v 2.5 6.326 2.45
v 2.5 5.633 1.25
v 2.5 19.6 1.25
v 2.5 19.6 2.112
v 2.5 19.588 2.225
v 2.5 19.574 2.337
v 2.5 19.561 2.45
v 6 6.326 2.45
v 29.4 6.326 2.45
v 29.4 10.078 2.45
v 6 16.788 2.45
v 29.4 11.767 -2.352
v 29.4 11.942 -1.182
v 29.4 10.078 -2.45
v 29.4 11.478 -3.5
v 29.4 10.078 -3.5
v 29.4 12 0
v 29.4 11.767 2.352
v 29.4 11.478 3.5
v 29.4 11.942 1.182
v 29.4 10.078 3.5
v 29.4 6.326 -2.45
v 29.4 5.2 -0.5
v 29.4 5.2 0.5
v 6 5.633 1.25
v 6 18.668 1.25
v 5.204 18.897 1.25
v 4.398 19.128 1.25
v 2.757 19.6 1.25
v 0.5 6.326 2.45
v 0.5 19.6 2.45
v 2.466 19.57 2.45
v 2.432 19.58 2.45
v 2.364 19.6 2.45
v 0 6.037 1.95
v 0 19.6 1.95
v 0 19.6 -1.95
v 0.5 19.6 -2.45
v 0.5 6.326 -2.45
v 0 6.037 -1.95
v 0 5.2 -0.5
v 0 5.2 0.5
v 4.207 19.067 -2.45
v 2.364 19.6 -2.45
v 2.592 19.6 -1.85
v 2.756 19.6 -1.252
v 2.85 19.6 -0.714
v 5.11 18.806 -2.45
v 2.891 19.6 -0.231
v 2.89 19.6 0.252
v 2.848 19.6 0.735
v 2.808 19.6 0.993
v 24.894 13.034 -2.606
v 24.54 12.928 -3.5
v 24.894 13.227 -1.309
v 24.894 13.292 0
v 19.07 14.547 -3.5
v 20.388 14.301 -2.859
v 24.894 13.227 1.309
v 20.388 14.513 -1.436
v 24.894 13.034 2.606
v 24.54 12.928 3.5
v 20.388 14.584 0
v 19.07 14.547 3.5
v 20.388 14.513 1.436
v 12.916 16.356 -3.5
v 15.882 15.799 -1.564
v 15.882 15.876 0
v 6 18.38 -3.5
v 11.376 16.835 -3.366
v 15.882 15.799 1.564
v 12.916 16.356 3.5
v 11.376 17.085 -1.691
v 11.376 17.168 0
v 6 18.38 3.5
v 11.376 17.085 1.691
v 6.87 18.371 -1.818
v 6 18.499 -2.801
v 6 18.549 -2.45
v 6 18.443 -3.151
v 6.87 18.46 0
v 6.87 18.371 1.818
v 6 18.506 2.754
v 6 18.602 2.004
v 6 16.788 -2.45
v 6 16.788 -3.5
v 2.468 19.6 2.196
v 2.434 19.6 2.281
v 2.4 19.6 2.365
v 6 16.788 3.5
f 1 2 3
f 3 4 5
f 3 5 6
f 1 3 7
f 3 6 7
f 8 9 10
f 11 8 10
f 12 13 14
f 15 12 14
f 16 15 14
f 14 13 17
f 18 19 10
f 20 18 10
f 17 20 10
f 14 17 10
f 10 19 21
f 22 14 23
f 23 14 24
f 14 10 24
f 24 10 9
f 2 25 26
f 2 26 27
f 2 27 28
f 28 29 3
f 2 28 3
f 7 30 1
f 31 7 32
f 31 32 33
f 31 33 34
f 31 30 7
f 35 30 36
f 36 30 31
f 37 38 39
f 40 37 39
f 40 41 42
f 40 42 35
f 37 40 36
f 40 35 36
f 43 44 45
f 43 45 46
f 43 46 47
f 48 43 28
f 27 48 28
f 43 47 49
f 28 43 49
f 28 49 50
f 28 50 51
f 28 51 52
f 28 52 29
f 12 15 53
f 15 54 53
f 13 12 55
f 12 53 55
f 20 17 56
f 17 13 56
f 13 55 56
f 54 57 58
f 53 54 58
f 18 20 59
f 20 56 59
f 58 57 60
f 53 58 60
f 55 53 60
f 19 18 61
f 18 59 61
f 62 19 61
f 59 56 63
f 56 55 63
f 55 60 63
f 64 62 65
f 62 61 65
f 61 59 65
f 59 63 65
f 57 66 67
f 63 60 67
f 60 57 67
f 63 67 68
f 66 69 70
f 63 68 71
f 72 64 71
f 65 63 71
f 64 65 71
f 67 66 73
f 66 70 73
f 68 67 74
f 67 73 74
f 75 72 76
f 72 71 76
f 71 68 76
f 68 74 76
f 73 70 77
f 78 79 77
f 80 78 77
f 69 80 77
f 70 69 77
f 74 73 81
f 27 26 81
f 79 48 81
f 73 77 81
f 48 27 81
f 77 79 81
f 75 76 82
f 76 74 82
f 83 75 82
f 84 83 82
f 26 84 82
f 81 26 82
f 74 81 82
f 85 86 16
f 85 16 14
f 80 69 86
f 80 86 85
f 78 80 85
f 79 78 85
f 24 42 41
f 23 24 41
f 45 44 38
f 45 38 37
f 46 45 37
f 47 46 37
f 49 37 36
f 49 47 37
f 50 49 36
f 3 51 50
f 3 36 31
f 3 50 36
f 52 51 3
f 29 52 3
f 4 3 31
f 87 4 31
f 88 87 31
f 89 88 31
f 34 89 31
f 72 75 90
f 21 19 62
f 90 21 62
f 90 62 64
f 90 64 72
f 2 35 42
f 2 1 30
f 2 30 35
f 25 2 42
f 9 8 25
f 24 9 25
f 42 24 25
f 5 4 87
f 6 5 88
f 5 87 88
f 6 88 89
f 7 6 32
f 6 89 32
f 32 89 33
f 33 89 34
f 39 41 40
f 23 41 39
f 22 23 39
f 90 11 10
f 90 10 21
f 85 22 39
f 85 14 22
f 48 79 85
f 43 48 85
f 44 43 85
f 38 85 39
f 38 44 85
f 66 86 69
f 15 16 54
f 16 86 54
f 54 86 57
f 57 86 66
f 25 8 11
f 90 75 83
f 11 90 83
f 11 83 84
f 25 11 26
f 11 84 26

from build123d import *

# Parameters (mm, degrees)
R_VOLUTION1_ANGLE       = 180
ESQUISSE3_OUTSIDE_W     = 53.726
ESQUISSE3_OUTSIDE_H     = 33.296
ENL_V_MAT_EXTRU_1_DEPTH = 42.220813774
ESQUISSE4_W             = 1.05
ESQUISSE4_H             = 30
ESQUISSE6_W             = 6
ESQUISSE6_H             = 1.05
ENL_V_MAT_EXTRU_2_DEPTH = 33.923699671
CHANFREIN1_SIZE         = 0.5


with BuildPart() as part:
    # Esquisse1 → Révolution1 (revolve, symmetric)
    with BuildSketch(Plane.XY) as r_volution1_sk:
        Polygon((0, 20.430314341), (0, 0), (29.4, 0), (29.4, 12), align=None)
    revolve(axis=Axis((0, 0, 0), (-1, 0, 0)), revolution_arc=R_VOLUTION1_ANGLE / 2)
    revolve(r_volution1_sk.sketch, axis=Axis((0, 0, 0), (1, 0, 0)), revolution_arc=R_VOLUTION1_ANGLE / 2)

    # Esquisse3 outside → Enlèv. mat.-Extru.1 (cut, through all)
    with BuildSketch(Plane(origin=(29.4, 0, 0), x_dir=(0, 0, -1), z_dir=(1, 0, 0))):
        with Locations((0, 10.215)):
            Rectangle(ESQUISSE3_OUTSIDE_W, ESQUISSE3_OUTSIDE_H)
        Polygon((-3.5, 6.932050808), (-0.5, 5.2), (0.5, 5.2), (3.5, 6.932050808), (3.5, 19.6), (-3.5, 19.6), align=None, mode=Mode.SUBTRACT)
    extrude(amount=-ENL_V_MAT_EXTRU_1_DEPTH, mode=Mode.SUBTRACT)

    # Enlèvement de matière-Balayage1: sweep along a path in Esquisse5
    with BuildLine(Plane(origin=(0, 0, 0), x_dir=(-1, 0, 0), z_dir=(0, 0, -1))) as enl_vement_de_mati_re_balayage1_path:
        Line((-29.4, 10.078240283), (0, 18.508554625))
    # Esquisse4 → Enlèvement de matière-Balayage1 (sweep, cut)
    with BuildSketch(Plane(origin=(29.4, 0, 0), x_dir=(0, 0, -1), z_dir=(1, 0, 0))):
        with Locations((2.975, -4.921759717)):
            Rectangle(ESQUISSE4_W, ESQUISSE4_H)
        with Locations((-2.975, -4.921759717)):
            Rectangle(ESQUISSE4_W, ESQUISSE4_H)
    sweep(path=enl_vement_de_mati_re_balayage1_path.line, mode=Mode.SUBTRACT)

    # Esquisse6 → Enlèv. mat.-Extru.2 (cut, through all)
    with BuildSketch(Plane(origin=(0, 19.6, 0), x_dir=(-1, 0, 0), z_dir=(0, 1, 0))):
        with Locations((-3, -2.975)):
            Rectangle(ESQUISSE6_W, ESQUISSE6_H)
        Polygon((0, 3.5), (-6, 3.5), (-6, 2.45), (-6, 1.25), (-2.5, 1.25), (-2.5, 2.45), (0, 2.45), align=None)
    extrude(amount=-ENL_V_MAT_EXTRU_2_DEPTH, mode=Mode.SUBTRACT)

    # Chanfrein1
    chanfrein1_edges = [part.edges().sort_by_distance(p)[0] for p in [
        (0, 12.962916512, -2.45),
        (0, 12.962916512, 2.45),
    ]]
    chamfer(chanfrein1_edges, length=CHANFREIN1_SIZE)


solid = part.part
